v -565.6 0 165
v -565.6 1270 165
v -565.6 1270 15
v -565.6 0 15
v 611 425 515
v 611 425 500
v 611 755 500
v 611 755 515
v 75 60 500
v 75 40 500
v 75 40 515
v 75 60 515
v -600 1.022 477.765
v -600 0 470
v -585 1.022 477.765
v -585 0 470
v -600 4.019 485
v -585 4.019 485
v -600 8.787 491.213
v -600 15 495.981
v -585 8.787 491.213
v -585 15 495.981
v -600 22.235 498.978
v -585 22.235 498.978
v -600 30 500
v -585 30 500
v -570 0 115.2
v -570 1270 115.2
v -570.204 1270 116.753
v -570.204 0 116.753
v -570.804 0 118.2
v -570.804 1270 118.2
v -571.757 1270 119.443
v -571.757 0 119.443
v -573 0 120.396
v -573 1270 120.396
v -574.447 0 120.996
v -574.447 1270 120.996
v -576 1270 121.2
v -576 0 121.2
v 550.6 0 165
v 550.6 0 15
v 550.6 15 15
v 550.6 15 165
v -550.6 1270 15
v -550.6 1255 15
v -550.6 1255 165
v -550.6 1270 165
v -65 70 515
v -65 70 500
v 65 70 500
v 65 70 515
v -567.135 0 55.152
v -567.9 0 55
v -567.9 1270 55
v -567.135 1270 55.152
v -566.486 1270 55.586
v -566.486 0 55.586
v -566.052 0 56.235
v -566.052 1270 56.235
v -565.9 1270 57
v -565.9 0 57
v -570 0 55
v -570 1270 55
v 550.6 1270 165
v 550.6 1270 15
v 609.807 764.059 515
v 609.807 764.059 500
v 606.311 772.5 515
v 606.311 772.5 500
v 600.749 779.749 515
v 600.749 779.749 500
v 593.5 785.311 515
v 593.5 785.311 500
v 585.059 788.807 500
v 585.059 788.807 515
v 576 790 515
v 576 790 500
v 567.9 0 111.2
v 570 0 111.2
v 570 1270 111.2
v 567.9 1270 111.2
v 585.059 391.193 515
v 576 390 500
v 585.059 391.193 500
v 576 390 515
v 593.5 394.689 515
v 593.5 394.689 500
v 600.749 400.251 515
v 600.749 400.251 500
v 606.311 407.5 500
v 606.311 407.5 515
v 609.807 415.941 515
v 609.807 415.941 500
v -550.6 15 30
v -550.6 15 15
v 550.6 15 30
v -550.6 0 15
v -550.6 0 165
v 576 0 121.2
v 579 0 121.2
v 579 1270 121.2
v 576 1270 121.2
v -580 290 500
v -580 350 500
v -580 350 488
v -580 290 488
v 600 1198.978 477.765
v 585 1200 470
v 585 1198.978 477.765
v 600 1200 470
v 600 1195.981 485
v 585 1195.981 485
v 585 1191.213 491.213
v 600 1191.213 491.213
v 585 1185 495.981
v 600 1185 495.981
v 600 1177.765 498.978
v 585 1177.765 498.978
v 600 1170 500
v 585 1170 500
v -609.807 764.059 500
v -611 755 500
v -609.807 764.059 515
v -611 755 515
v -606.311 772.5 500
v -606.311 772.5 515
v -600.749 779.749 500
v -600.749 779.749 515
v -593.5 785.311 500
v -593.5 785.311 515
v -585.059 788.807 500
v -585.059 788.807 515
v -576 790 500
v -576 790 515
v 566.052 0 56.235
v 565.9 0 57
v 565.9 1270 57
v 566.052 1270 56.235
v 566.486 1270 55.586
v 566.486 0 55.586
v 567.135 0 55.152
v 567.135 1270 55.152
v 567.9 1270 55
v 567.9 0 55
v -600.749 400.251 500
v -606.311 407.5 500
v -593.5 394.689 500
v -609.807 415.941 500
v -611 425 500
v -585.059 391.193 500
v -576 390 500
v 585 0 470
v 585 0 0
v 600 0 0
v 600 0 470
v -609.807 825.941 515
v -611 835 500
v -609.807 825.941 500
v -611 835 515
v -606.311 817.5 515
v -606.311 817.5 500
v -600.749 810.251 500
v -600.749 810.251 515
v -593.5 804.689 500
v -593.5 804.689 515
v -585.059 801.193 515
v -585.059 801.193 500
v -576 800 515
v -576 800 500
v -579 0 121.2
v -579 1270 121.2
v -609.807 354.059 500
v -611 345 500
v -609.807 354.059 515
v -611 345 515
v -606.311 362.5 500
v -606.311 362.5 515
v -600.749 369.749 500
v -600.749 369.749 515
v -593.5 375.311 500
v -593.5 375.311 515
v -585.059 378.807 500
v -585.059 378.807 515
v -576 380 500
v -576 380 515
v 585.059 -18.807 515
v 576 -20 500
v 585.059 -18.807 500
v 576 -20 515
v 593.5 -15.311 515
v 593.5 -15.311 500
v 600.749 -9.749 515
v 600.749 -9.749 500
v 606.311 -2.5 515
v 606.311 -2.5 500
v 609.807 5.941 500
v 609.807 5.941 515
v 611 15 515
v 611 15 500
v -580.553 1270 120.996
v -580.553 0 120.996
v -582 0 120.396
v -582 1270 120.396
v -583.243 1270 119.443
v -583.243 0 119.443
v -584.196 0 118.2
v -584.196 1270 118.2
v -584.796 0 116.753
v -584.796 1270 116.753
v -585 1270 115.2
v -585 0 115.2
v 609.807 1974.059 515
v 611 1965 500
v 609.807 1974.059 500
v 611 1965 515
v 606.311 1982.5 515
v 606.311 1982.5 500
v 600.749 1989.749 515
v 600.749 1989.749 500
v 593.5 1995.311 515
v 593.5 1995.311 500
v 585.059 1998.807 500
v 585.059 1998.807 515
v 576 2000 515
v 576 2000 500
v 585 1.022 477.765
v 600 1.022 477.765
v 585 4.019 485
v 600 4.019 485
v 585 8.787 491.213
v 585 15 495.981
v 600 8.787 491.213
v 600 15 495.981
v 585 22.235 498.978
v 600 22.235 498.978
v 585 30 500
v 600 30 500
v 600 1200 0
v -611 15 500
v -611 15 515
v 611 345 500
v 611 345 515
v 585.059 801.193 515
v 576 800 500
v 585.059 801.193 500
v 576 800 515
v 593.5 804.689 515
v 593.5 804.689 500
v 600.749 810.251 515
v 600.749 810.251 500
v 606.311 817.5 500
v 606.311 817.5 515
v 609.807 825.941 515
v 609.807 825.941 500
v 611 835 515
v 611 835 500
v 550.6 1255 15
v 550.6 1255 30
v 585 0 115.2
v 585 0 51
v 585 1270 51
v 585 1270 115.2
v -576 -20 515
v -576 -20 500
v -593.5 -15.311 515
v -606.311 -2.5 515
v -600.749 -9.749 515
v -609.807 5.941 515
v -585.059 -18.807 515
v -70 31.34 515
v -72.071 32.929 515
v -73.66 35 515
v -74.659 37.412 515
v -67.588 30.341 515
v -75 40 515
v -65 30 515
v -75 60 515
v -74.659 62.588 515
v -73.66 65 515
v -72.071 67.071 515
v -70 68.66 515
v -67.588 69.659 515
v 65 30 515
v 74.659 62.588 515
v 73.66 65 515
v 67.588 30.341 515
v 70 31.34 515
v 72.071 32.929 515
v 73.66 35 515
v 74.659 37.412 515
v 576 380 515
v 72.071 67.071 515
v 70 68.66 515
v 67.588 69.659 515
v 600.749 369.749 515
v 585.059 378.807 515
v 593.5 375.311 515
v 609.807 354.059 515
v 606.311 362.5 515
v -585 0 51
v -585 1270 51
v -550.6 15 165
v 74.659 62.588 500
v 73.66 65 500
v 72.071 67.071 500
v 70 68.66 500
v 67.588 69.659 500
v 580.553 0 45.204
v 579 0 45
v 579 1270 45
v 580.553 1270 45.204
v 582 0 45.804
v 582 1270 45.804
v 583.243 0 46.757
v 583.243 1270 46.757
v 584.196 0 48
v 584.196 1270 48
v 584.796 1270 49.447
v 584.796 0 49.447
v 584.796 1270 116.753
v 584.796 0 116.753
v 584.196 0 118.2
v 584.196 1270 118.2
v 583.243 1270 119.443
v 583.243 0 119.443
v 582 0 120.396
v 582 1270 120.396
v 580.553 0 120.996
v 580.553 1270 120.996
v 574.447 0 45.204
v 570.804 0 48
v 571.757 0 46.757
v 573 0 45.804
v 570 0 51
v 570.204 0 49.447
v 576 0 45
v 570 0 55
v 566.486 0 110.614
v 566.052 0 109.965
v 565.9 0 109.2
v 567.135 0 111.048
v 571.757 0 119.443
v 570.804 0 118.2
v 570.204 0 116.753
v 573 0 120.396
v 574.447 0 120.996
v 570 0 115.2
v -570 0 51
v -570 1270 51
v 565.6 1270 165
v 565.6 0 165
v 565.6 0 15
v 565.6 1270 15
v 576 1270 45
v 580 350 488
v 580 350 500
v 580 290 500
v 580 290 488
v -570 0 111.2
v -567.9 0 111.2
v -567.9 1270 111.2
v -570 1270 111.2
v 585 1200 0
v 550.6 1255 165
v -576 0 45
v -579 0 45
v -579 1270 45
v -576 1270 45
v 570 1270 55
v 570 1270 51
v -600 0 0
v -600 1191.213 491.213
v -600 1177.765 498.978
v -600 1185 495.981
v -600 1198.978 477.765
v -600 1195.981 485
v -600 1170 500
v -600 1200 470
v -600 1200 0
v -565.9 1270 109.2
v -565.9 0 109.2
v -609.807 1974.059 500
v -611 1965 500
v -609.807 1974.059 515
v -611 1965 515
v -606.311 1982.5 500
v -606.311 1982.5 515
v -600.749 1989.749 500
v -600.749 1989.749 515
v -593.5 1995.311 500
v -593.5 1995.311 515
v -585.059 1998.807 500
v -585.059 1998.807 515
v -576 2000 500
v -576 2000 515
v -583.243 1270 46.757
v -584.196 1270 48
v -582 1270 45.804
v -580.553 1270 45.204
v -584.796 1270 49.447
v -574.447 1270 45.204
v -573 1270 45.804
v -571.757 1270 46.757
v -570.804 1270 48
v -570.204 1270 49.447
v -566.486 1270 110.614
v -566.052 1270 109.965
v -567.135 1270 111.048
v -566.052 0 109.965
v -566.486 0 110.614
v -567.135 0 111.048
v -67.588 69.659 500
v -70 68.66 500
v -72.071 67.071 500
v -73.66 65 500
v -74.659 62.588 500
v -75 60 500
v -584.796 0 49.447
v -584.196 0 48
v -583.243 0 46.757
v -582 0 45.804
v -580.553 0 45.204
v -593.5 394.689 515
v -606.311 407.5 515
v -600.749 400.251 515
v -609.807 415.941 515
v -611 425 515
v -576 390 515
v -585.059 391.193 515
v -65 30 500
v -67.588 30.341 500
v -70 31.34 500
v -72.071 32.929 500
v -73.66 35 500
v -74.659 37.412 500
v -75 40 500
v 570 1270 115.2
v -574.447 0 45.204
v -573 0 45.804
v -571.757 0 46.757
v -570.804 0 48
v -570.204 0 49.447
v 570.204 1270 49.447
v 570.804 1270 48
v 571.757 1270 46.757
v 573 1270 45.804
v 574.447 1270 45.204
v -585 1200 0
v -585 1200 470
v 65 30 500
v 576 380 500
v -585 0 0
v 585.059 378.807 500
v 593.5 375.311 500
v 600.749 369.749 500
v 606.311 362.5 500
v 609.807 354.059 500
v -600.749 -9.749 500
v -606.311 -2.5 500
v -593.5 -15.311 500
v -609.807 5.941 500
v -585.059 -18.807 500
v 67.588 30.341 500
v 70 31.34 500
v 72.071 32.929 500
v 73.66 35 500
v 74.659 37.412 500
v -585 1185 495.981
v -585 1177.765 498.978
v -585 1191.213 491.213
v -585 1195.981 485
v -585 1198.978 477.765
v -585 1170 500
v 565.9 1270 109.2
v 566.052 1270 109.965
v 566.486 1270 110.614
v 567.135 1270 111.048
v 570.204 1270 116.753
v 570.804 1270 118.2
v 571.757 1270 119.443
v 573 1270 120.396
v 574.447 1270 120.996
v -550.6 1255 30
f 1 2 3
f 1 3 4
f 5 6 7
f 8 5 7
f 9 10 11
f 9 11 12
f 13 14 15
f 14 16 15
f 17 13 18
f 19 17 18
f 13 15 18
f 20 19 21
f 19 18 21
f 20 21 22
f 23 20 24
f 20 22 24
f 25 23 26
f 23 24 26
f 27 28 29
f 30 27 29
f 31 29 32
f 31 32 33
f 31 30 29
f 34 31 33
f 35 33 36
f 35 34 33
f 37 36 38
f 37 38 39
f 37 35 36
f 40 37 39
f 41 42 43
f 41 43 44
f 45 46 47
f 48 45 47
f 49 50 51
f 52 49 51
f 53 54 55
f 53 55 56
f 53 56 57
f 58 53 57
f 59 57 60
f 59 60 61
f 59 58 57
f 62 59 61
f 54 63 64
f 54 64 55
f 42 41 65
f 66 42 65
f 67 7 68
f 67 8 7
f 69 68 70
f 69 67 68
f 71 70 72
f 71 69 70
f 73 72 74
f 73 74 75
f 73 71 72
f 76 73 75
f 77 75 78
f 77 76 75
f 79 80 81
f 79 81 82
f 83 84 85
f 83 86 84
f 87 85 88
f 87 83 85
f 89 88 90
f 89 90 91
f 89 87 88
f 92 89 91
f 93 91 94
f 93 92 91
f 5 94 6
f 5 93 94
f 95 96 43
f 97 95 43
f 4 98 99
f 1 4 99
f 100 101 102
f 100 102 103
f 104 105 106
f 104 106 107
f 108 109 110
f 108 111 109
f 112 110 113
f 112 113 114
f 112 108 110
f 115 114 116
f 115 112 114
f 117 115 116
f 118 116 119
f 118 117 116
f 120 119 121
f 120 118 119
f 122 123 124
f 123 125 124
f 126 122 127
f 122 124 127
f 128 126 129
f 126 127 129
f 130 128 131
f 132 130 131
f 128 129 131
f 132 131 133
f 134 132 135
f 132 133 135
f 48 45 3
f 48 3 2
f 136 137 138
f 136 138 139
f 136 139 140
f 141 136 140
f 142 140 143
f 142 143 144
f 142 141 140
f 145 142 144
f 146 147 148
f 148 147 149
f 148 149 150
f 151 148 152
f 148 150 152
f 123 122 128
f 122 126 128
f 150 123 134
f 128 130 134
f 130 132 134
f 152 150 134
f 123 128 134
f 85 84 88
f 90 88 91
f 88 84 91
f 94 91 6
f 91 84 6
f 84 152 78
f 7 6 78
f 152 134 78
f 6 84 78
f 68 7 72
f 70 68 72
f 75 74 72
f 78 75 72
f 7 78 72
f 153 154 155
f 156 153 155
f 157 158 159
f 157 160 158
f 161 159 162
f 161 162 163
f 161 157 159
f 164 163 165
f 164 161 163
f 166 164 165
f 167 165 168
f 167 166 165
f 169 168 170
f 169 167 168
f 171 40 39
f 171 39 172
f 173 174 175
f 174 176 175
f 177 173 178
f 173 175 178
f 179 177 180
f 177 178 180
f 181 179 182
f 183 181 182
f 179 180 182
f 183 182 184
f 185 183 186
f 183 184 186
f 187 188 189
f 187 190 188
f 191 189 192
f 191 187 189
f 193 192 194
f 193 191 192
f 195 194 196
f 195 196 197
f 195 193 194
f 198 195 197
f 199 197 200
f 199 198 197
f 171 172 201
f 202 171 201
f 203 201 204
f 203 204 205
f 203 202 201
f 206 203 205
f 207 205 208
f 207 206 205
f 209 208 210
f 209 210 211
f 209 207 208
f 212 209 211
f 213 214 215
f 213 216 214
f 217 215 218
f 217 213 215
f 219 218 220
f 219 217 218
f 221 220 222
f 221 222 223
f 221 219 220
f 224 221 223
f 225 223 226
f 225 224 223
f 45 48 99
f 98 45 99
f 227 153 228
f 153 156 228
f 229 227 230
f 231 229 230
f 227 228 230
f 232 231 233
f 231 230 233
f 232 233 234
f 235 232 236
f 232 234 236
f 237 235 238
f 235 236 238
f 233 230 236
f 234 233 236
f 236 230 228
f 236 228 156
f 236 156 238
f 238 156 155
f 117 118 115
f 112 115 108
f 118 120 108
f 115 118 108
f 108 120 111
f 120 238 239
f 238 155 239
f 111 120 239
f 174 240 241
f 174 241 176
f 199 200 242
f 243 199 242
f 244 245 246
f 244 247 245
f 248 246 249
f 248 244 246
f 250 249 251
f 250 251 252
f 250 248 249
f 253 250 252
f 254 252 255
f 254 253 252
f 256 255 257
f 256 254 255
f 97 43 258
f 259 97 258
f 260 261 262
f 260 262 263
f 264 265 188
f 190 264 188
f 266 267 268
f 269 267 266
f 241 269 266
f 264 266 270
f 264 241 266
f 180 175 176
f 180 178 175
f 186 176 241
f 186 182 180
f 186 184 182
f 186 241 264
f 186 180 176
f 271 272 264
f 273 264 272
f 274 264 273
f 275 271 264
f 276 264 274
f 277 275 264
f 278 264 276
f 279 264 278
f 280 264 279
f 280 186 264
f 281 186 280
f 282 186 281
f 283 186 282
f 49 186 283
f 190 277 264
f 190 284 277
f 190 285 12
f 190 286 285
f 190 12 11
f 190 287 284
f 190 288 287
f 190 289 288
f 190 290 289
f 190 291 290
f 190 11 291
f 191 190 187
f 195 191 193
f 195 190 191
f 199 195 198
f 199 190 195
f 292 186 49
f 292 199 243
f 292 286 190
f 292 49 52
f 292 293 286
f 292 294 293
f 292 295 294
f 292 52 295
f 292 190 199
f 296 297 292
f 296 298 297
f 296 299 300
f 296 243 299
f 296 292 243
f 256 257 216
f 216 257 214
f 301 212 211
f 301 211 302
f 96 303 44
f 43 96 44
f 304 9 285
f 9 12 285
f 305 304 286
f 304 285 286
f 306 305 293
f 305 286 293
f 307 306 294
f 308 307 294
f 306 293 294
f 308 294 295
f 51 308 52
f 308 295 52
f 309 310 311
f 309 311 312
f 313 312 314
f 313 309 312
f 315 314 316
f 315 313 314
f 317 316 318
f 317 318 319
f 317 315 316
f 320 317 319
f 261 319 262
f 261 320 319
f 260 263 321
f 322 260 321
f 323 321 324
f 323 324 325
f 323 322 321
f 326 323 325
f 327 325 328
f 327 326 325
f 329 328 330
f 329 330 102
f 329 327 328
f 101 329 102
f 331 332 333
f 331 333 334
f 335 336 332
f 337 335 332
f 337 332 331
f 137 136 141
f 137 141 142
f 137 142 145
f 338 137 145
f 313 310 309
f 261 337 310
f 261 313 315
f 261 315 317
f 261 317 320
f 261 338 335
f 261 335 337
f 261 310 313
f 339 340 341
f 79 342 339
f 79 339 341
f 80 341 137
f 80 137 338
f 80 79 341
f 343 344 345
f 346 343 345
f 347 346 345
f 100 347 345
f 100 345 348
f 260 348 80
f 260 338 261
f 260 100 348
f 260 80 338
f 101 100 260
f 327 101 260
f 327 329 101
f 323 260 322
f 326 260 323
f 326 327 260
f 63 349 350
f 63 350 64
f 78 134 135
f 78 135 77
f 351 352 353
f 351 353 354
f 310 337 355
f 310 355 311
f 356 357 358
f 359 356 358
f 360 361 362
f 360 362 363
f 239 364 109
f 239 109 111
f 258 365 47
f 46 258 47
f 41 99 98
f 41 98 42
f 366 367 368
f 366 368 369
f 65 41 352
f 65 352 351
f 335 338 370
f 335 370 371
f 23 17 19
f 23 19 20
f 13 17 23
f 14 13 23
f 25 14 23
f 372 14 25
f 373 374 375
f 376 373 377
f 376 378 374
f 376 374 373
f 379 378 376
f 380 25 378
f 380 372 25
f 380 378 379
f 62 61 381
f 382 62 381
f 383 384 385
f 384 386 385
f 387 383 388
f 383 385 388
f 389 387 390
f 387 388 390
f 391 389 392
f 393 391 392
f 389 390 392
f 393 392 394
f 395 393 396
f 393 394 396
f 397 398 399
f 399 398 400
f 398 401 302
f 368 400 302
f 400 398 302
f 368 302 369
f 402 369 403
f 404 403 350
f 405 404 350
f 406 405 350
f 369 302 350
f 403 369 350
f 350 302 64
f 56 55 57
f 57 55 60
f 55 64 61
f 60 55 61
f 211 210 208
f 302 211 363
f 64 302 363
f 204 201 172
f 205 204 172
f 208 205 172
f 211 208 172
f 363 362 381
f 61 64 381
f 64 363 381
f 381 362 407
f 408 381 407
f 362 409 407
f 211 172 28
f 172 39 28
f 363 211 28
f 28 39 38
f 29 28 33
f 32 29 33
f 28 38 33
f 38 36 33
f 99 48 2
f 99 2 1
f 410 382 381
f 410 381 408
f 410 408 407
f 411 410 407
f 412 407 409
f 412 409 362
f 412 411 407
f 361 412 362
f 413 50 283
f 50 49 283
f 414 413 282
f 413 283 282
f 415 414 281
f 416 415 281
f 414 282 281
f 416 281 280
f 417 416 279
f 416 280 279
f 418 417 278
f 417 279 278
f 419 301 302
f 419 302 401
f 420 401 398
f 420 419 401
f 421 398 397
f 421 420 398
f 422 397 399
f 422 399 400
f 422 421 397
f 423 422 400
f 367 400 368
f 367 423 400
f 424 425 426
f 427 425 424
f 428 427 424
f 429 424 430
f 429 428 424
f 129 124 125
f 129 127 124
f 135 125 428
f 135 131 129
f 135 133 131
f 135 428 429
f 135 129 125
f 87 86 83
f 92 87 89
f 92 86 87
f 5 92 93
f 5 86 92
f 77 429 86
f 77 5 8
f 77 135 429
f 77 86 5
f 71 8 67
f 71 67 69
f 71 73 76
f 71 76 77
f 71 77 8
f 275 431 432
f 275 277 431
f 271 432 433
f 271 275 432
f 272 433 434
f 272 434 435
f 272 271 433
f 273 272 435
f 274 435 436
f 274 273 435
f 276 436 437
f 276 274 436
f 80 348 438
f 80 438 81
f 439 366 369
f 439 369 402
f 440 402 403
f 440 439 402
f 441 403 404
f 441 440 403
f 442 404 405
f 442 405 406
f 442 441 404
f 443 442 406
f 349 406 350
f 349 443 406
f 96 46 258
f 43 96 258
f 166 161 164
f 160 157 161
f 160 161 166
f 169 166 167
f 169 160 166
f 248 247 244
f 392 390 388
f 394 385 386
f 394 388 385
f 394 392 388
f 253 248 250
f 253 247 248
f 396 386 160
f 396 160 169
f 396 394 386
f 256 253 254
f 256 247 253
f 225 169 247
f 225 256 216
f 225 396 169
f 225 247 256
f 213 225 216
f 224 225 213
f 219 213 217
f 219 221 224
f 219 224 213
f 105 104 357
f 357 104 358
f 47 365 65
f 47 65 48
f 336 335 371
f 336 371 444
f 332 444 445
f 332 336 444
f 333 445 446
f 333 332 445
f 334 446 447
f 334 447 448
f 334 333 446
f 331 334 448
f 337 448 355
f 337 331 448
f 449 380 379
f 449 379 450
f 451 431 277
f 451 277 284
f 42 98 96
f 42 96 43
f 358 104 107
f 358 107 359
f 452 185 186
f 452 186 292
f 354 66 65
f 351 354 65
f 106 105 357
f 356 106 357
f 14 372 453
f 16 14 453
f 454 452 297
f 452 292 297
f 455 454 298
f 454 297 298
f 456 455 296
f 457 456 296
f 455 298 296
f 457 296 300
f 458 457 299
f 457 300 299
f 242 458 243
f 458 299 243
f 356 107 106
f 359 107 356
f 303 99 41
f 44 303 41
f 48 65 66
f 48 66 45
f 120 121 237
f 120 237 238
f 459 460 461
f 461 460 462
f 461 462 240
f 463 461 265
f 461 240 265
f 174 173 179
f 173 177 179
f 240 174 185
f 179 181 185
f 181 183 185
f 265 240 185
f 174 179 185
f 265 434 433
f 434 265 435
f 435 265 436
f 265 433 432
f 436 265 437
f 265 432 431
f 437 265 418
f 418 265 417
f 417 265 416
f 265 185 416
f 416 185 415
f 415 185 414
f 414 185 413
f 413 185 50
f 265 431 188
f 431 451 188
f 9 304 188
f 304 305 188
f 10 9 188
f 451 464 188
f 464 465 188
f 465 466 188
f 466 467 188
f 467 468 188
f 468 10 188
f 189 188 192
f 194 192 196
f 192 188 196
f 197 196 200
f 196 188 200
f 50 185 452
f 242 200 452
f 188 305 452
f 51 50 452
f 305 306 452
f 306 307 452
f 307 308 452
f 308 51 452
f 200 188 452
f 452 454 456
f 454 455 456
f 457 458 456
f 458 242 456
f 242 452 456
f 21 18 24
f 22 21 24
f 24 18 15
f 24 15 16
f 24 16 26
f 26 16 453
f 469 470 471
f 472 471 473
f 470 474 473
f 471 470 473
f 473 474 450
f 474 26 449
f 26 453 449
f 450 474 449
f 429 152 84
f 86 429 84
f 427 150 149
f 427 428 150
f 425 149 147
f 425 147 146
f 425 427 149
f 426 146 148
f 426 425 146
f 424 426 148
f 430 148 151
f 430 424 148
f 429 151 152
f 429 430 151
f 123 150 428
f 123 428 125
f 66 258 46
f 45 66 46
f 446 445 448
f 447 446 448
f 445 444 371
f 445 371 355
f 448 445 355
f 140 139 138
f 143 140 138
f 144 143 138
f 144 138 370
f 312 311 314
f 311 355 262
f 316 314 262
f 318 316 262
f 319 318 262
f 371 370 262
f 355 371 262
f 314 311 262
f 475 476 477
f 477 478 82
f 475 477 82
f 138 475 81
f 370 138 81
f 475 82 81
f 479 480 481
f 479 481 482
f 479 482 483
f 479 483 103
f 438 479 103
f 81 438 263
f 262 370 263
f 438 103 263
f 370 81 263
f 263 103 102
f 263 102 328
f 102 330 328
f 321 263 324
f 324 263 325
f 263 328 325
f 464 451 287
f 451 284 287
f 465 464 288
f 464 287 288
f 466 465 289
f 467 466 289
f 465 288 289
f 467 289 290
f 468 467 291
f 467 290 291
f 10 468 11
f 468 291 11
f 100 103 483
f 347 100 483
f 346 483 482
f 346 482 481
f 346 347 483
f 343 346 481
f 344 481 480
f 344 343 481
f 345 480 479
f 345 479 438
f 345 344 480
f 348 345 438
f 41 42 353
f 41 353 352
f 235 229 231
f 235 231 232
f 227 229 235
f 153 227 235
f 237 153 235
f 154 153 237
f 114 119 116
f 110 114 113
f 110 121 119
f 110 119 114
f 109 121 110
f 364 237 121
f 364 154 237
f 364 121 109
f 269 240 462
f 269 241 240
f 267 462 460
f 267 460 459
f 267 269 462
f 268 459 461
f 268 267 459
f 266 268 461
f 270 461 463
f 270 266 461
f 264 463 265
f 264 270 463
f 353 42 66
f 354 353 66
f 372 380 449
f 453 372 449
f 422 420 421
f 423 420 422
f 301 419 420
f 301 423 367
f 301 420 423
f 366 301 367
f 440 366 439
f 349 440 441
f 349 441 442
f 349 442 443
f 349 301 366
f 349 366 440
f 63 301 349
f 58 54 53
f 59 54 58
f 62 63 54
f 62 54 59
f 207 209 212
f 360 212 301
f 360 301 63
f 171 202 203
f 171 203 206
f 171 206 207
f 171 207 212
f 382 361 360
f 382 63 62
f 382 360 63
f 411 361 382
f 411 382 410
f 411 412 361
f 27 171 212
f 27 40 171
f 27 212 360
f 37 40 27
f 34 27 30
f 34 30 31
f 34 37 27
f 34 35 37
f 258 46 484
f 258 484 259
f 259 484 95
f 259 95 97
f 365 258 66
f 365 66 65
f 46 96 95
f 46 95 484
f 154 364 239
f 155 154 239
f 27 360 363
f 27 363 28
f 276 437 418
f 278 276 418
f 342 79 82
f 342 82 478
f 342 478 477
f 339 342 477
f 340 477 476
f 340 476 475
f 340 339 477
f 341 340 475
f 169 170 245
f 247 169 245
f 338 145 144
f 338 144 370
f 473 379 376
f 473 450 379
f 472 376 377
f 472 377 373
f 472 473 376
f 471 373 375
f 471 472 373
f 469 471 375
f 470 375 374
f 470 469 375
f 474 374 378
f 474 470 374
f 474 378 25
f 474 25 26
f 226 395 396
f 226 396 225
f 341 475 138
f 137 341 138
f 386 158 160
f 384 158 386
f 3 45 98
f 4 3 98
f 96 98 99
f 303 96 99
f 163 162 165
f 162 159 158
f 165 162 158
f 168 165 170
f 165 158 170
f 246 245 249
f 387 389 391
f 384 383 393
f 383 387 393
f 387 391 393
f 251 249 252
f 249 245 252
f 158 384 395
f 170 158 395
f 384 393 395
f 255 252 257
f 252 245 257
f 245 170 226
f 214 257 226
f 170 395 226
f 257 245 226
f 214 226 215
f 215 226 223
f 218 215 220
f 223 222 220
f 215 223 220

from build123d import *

# Parameters (mm, degrees)
F0_W      = 15
F0_H      = 1200
F1_DEPTH  = 500
F2_R      = 30
F2_2_R    = 30
F4_W      = 1222
F4_H      = 1200
F5_DEPTH  = 15
F6_W      = 1222
F6_H      = 400
F7_DEPTH  = 15
F8_W      = 1222
F8_H      = 400
F8_W_2    = 150
F8_H_2    = 40
F9_DEPTH  = 15
F10_R     = 10
F11_R     = 35
F11_2_R   = 35
F11_3_R   = 35
F13_W     = 1101.2
F13_H     = 1240
F14_DEPTH = 15
F15_W     = 1101.2
F15_H     = 150
F16_DEPTH = 15
F17_W     = 1101.2
F17_H     = 150
F18_DEPTH = 15
F19_W     = 1270
F19_H     = 150
F20_DEPTH = 15
F21_W     = 1270
F21_H     = 150
F22_DEPTH = 15
F24_DEPTH = 1270
F25_W     = 1160
F25_H     = 60
F26_DEPTH = 12


with BuildPart() as f1:
    # F0 (on Top) → F1 (new body)
    with BuildSketch(Plane.XY):
        with Locations((592.5, 600)):
            Rectangle(F0_W, F0_H)
    extrude(amount=F1_DEPTH)

    # F2#2
    f2_2_edges = [f1.edges().sort_by_distance(p)[0] for p in [
        (592.5, 1200, 500),
        (592.5, 0, 500),
    ]]
    fillet(f2_2_edges, radius=F2_2_R)


with BuildPart() as f1b:
    # F0 (on Top) → F1, piece 2 (new body)
    with BuildSketch(Plane.XY):
        with Locations((-592.5, 600)):
            Rectangle(F0_W, F0_H)
    extrude(amount=F1_DEPTH)

    # F2
    f2_edges = [f1b.edges().sort_by_distance(p)[0] for p in [
        (-592.5, 0, 500),
        (-592.5, 1200, 500),
    ]]
    fillet(f2_edges, radius=F2_R)


with BuildPart() as f5:
    # F4 (on offset) → F5 (new body)
    with BuildSketch(Plane.XY.offset(500)):
        with Locations((0, 1400)):
            Rectangle(F4_W, F4_H)
    extrude(amount=F5_DEPTH)

    # F11#2
    f11_2_edges = [f5.edges().sort_by_distance(p)[0] for p in [
        (-611, 2000, 507.5),
        (611, 2000, 507.5),
        (611, 800, 507.5),
        (-611, 800, 507.5),
    ]]
    fillet(f11_2_edges, radius=F11_2_R)


with BuildPart() as f7:
    # F6 (on offset) → F7 (new body)
    with BuildSketch(Plane.XY.offset(500)):
        with Locations((0, 590)):
            Rectangle(F6_W, F6_H)
    extrude(amount=F7_DEPTH)

    # F11#3
    f11_3_edges = [f7.edges().sort_by_distance(p)[0] for p in [
        (611, 790, 507.5),
        (611, 390, 507.5),
        (-611, 790, 507.5),
        (-611, 390, 507.5),
    ]]
    fillet(f11_3_edges, radius=F11_3_R)


with BuildPart() as f9:
    # F8 (on offset) → F9 (new body)
    with BuildSketch(Plane.XY.offset(500)):
        with Locations((0, 180)):
            Rectangle(F8_W, F8_H)
        with Locations((0, 50)):
            Rectangle(F8_W_2, F8_H_2, mode=Mode.SUBTRACT)
    extrude(amount=F9_DEPTH)

    # F10
    f10_edges = [f9.edges().sort_by_distance(p)[0] for p in [
        (-75, 70, 507.5),
        (75, 70, 507.5),
        (75, 30, 507.5),
        (-75, 30, 507.5),
    ]]
    fillet(f10_edges, radius=F10_R)

    # F11
    f11_edges = [f9.edges().sort_by_distance(p)[0] for p in [
        (611, -20, 507.5),
        (-611, -20, 507.5),
        (611, 380, 507.5),
        (-611, 380, 507.5),
    ]]
    fillet(f11_edges, radius=F11_R)


with BuildPart() as f14:
    # F13 (on offset) → F14 (new body)
    with BuildSketch(Plane.XY.offset(15)):
        with Locations((0, 635)):
            Rectangle(F13_W, F13_H)
    extrude(amount=F14_DEPTH)


with BuildPart() as f16:
    # F15 (on Front) → F16 (new body)
    with BuildSketch(Plane.XZ):
        with Locations((0, 90)):
            Rectangle(F15_W, F15_H)
    extrude(amount=-F16_DEPTH)


with BuildPart() as f18:
    # F17 (on face) → F18 (new body)
    with BuildSketch(Plane(origin=(0, 1255, 0), x_dir=(-1, 0, 0), z_dir=(0, 1, 0))):
        with Locations((0, 90)):
            Rectangle(F17_W, F17_H)
    extrude(amount=F18_DEPTH)


with BuildPart() as f20:
    # F19 (on face) → F20 (new body)
    with BuildSketch(Plane.YZ.offset(550.6)):
        with Locations((635, 90)):
            Rectangle(F19_W, F19_H)
    extrude(amount=F20_DEPTH)


with BuildPart() as f22:
    # F21 (on face) → F22 (new body)
    with BuildSketch(Plane(origin=(-550.6, 0, 0), x_dir=(0, -1, 0), z_dir=(-1, 0, 0))):
        with Locations((-635, 90)):
            Rectangle(F21_W, F21_H)
    extrude(amount=F22_DEPTH)


with BuildPart() as f24:
    # F23 (on Front) → F24 (new body)
    with BuildSketch(Plane.XZ):
        with BuildLine():
            Line((576, 45), (579, 45))
            ThreePointArc((579, 45), (583.2426406871, 46.7573593129), (585, 51))
            Line((585, 51), (585, 115.2))
            ThreePointArc((585, 115.2), (583.2426406871, 119.4426406871), (579, 121.2))
            Line((579, 121.2), (576, 121.2))
            ThreePointArc((576, 121.2), (571.7573593129, 119.4426406871), (570, 115.2))
            Line((570, 115.2), (570, 111.2))
            Line((570, 111.2), (570, 55))
            Line((570, 55), (570, 51))
            ThreePointArc((570, 51), (571.7573593129, 46.7573593129), (576, 45))
        make_face()
        with BuildLine():
            Line((567.9, 55), (570, 55))
            Line((570, 55), (570, 111.2))
            Line((570, 111.2), (567.9, 111.2))
            ThreePointArc((567.9, 111.2), (566.4857864376, 110.6142135624), (565.9, 109.2))
            Line((565.9, 109.2), (565.9, 57))
            ThreePointArc((565.9, 57), (566.4857864376, 55.5857864376), (567.9, 55))
        make_face()
    extrude(amount=-F24_DEPTH)


with BuildPart() as f24b:
    # F23 (on Front) → F24, piece 2 (new body)
    with BuildSketch(Plane.XZ):
        with BuildLine():
            ThreePointArc((-567.9, 55), (-566.4857864376, 55.5857864376), (-565.9, 57))
            Line((-565.9, 57), (-565.9, 109.2))
            ThreePointArc((-565.9, 109.2), (-566.4857864376, 110.6142135624), (-567.9, 111.2))
            Line((-567.9, 111.2), (-570, 111.2))
            Line((-570, 111.2), (-570, 55))
            Line((-570, 55), (-567.9, 55))
        make_face()
        with BuildLine():
            Line((-570, 51), (-570, 55))
            Line((-570, 55), (-570, 111.2))
            Line((-570, 111.2), (-570, 115.2))
            ThreePointArc((-570, 115.2), (-571.7573593129, 119.4426406871), (-576, 121.2))
            Line((-576, 121.2), (-579, 121.2))
            ThreePointArc((-579, 121.2), (-583.2426406871, 119.4426406871), (-585, 115.2))
            Line((-585, 115.2), (-585, 51))
            ThreePointArc((-585, 51), (-583.2426406871, 46.7573593129), (-579, 45))
            Line((-579, 45), (-576, 45))
            ThreePointArc((-576, 45), (-571.7573593129, 46.7573593129), (-570, 51))
        make_face()
    extrude(amount=-F24_DEPTH)


with BuildPart() as f26:
    # F25 (on face) → F26 (new body)
    with BuildSketch(Plane(origin=(0, 0, 500), x_dir=(1, 0, 0), z_dir=(0, 0, -1))):
        with Locations((0, -320)):
            Rectangle(F25_W, F25_H)
    extrude(amount=F26_DEPTH)


solid = Compound([f1.part, f1b.part, f5.part, f7.part, f9.part, f14.part, f16.part, f18.part, f20.part, f22.part, f24.part, f24b.part, f26.part])
